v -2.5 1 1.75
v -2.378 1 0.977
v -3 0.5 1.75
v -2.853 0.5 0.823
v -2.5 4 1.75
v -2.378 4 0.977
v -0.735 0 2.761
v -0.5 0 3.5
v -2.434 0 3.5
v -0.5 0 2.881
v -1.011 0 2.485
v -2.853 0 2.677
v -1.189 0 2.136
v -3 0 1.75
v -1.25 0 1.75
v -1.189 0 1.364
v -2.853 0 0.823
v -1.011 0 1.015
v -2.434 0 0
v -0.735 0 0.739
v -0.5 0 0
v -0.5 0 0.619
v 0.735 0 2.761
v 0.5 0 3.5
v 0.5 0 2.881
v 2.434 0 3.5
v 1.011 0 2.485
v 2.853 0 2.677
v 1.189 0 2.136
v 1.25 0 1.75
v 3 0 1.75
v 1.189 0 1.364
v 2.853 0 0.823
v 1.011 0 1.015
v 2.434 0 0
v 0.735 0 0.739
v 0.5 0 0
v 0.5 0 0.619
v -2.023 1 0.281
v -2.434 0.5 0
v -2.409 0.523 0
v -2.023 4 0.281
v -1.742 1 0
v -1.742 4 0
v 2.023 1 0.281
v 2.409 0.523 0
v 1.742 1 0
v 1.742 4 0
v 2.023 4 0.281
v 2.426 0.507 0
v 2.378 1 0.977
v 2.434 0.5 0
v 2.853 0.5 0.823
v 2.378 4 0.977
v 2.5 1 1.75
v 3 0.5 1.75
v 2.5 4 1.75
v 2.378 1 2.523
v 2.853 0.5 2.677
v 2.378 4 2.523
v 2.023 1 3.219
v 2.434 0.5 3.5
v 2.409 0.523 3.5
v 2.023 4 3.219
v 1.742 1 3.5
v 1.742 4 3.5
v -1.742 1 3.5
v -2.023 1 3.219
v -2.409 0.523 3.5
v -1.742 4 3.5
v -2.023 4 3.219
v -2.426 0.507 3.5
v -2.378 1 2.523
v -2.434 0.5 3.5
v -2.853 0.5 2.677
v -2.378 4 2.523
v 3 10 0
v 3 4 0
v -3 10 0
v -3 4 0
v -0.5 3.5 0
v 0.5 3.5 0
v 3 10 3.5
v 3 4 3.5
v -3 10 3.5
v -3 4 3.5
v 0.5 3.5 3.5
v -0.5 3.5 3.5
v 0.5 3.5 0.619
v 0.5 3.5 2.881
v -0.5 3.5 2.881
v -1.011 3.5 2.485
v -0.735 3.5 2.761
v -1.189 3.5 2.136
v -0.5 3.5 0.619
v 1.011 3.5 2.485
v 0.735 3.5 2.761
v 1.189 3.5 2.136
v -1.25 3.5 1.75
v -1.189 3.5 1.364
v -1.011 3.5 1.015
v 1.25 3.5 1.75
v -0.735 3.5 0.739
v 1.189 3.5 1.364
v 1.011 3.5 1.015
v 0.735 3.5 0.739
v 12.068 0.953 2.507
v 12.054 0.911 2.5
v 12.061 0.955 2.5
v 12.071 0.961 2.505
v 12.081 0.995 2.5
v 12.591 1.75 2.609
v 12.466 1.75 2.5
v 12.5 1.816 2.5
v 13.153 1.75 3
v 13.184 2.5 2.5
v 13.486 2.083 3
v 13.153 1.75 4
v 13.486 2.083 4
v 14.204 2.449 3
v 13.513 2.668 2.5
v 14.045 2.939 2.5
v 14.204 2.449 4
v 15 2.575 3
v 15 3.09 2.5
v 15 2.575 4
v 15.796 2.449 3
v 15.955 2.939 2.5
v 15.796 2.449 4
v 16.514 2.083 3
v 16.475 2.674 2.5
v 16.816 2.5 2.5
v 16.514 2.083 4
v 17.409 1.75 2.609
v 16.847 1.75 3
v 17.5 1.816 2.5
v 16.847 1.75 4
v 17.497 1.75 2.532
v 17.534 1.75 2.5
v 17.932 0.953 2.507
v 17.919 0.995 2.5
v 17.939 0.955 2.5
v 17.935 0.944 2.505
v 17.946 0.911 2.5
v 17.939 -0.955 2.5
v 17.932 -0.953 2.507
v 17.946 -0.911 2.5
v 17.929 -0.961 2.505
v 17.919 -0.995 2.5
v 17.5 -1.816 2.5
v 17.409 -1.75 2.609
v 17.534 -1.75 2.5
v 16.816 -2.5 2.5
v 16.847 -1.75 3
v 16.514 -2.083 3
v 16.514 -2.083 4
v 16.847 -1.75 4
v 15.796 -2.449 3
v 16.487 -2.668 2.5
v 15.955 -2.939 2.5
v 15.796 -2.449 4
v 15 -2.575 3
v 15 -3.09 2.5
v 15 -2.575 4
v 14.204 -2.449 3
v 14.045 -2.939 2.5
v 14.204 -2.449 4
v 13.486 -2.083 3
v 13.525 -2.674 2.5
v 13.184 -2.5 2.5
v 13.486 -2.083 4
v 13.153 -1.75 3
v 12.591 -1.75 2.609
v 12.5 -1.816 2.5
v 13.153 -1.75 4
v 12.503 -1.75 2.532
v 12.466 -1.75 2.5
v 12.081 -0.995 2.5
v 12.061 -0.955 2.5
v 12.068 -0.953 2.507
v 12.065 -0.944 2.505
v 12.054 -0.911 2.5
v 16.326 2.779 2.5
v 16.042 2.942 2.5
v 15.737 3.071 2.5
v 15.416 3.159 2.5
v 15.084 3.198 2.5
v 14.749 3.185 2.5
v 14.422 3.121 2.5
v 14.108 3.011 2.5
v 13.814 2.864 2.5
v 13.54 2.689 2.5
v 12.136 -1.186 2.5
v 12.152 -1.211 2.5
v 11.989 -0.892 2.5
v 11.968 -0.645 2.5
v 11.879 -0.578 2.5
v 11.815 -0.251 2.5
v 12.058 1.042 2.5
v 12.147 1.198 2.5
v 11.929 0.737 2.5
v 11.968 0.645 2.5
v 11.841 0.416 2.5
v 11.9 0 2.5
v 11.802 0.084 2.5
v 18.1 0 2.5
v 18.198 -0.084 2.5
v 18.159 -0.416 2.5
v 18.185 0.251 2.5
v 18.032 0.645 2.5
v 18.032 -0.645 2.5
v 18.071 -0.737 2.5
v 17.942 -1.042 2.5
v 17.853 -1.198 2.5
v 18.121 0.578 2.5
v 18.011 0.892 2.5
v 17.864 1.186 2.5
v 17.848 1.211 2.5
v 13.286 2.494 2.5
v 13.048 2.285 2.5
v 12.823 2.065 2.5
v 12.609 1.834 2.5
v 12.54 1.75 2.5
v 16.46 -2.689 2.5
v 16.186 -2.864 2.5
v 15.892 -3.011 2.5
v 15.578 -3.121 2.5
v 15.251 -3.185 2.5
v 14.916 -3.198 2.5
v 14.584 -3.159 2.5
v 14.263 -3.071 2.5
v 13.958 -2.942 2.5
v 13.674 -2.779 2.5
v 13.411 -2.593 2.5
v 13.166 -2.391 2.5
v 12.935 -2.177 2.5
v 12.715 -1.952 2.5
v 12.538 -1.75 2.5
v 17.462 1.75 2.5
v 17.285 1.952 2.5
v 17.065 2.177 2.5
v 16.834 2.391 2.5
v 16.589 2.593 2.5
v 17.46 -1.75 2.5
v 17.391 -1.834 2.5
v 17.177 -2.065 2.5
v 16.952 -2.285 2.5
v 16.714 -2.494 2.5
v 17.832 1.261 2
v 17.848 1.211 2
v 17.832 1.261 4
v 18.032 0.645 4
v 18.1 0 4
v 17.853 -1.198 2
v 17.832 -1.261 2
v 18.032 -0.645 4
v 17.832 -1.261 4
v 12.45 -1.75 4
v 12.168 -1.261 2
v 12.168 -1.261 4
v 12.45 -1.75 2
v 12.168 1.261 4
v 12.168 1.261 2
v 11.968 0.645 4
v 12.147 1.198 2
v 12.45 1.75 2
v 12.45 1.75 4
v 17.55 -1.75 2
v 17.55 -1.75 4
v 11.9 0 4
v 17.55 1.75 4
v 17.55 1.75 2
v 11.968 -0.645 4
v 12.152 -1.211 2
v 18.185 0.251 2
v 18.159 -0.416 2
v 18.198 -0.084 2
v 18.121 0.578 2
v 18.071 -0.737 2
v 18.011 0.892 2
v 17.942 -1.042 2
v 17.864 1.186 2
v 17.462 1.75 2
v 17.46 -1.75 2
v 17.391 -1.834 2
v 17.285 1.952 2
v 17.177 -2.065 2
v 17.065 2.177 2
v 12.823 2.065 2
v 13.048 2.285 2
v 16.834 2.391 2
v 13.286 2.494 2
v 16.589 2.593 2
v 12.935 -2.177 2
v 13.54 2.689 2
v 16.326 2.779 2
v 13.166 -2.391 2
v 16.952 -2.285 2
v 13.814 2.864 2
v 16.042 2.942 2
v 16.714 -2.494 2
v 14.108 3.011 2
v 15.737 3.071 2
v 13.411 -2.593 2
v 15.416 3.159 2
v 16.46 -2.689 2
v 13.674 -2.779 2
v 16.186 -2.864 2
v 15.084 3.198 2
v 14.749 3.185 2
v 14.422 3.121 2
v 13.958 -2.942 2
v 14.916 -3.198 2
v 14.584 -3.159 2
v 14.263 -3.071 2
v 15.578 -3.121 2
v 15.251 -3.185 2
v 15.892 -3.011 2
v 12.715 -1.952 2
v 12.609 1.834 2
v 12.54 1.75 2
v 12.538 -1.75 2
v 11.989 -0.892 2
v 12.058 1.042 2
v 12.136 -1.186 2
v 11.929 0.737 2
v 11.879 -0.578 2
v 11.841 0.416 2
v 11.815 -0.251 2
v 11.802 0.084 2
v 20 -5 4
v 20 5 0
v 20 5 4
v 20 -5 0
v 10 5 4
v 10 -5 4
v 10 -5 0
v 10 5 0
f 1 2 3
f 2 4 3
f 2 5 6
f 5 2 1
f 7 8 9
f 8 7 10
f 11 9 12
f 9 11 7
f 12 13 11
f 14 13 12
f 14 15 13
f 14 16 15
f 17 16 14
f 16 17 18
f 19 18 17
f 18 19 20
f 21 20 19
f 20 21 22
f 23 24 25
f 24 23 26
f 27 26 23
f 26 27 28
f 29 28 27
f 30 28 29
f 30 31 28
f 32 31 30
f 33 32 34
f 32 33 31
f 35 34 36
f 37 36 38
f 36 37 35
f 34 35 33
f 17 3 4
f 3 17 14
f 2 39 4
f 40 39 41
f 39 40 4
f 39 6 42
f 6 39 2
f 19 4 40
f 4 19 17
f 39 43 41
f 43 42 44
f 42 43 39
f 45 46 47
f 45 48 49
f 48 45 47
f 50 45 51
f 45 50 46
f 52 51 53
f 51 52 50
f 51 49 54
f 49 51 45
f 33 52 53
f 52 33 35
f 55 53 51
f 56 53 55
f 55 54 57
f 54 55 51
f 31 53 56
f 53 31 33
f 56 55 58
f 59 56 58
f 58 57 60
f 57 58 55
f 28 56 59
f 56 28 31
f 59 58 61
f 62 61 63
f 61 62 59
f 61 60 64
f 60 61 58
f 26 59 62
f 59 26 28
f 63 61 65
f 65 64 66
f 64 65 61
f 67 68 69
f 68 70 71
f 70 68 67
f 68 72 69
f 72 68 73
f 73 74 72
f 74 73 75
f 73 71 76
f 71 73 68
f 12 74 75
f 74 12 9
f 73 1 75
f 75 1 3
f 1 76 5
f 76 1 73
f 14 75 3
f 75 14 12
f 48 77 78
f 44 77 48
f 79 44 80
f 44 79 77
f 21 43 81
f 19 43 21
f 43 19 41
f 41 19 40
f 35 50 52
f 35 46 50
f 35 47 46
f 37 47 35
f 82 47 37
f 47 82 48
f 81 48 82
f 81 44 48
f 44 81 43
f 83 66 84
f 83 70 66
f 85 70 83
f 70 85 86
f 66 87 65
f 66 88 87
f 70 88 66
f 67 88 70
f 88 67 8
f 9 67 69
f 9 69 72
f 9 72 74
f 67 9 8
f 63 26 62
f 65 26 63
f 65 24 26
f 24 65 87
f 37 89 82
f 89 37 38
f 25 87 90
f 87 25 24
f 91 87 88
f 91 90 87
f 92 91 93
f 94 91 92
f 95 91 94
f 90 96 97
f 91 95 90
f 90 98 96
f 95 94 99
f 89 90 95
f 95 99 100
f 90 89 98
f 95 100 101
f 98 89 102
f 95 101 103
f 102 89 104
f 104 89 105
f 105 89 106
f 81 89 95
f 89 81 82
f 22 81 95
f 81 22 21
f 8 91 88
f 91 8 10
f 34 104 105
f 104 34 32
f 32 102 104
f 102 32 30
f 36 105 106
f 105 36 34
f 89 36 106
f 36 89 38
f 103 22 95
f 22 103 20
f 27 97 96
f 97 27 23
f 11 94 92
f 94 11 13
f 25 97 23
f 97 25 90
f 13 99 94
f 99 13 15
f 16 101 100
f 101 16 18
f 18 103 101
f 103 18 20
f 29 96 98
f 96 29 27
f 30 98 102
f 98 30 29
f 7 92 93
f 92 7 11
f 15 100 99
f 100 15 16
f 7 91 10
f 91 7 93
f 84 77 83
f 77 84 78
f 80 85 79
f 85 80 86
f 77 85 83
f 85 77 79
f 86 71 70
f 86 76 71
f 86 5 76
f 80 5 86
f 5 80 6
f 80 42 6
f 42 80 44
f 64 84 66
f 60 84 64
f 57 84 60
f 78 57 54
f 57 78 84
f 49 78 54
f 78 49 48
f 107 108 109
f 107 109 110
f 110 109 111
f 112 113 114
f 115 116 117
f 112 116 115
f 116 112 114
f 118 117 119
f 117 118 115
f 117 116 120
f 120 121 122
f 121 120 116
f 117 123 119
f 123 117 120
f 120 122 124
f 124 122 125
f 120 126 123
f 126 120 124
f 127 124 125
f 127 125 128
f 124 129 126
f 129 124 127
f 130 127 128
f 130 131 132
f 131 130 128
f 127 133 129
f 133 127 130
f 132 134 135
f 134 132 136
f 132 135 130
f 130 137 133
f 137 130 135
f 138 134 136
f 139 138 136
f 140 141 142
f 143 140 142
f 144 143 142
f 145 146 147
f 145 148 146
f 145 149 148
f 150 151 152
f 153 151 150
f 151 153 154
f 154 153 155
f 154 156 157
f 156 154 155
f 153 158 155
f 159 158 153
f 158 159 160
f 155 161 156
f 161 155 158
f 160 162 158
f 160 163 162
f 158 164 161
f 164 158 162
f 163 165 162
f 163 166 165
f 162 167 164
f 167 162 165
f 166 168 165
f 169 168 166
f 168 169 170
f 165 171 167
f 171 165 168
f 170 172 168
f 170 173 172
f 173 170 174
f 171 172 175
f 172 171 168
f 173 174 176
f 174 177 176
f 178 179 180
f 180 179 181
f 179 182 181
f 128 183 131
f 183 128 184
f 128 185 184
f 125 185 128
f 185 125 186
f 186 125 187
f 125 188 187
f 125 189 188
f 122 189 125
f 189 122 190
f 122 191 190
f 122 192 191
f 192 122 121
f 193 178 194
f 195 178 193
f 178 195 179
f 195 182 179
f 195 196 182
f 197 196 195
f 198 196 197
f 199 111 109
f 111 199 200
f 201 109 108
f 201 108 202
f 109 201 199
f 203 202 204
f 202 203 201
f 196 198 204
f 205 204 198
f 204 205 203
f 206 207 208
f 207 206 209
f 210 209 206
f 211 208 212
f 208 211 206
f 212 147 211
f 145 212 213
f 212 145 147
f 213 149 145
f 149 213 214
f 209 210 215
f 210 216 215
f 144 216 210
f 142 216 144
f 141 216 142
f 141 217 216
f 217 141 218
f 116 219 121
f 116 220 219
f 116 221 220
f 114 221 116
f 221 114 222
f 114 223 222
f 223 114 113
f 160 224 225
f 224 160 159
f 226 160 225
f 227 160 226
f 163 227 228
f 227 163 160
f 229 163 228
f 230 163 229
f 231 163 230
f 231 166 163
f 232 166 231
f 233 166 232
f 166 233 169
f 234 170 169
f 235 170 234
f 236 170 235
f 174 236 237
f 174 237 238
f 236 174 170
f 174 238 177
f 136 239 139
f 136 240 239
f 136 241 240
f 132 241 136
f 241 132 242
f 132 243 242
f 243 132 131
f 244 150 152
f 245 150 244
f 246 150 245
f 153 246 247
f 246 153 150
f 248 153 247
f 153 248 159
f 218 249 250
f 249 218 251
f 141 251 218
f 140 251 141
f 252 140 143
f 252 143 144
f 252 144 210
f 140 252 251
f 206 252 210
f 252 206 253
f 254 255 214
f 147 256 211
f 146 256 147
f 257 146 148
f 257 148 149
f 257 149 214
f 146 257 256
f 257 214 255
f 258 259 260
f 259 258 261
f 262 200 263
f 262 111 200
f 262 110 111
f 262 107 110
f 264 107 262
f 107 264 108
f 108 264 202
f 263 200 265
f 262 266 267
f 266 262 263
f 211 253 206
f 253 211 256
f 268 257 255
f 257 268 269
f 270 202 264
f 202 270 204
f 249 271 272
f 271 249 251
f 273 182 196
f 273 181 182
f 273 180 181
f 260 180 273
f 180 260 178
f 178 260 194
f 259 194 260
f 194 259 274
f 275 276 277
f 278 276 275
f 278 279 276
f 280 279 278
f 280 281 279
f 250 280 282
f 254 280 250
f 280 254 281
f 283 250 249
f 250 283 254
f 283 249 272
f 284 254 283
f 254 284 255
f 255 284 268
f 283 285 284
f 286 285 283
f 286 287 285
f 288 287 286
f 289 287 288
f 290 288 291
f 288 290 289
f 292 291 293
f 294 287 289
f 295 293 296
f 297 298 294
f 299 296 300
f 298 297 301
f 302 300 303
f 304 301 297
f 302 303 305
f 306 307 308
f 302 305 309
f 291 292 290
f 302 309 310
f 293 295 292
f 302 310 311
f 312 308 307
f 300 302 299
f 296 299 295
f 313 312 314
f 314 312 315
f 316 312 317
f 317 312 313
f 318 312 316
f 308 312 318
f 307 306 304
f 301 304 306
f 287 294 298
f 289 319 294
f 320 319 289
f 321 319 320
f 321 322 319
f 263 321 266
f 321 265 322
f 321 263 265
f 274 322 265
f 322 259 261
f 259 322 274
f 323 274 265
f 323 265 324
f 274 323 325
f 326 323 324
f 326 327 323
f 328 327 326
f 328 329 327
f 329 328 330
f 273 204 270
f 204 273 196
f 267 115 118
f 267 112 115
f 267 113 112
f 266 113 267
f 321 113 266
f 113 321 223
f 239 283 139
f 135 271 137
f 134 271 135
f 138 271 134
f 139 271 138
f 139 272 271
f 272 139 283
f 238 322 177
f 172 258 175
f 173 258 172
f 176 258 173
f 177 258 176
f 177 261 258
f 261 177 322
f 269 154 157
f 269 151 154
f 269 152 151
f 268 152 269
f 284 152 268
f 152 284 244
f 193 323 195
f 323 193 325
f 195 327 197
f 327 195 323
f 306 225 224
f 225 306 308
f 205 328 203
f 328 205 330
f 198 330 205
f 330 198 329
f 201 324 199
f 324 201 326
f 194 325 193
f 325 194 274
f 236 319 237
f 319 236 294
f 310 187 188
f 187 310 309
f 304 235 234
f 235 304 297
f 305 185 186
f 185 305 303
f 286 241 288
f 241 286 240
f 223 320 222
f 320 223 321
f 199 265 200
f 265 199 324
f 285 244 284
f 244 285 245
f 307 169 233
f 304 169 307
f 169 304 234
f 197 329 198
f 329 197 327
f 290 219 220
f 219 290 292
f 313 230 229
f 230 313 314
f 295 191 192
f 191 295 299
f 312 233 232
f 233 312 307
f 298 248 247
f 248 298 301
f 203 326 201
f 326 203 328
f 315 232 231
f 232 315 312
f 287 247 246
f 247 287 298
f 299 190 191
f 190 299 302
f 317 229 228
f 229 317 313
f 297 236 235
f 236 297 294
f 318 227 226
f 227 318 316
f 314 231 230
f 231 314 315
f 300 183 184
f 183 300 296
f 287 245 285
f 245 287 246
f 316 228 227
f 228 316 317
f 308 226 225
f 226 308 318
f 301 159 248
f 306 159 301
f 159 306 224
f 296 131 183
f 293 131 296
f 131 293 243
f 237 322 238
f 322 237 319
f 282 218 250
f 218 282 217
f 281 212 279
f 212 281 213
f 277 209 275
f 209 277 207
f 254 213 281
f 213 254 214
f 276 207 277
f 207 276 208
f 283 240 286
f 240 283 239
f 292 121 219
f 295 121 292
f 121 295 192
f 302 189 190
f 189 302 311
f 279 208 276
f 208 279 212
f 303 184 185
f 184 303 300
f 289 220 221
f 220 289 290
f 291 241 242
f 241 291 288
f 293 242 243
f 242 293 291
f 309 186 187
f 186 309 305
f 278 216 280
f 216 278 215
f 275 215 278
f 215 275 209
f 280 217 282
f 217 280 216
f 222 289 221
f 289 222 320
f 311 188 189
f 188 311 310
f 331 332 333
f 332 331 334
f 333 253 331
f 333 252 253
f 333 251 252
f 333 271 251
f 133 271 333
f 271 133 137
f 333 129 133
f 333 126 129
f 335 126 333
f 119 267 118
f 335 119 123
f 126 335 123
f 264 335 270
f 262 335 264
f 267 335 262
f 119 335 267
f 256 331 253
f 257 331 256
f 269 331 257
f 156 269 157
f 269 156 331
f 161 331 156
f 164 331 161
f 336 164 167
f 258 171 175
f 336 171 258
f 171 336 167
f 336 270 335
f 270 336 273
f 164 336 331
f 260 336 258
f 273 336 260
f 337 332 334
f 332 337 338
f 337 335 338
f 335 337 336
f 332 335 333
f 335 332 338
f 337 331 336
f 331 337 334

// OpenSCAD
lipl = 1.0; //lip length
lipd = 6.0;
ebl = 5.0; //overall length of the endbody
linkd = 5.0; //link body diameter
linkh = 3.5; //link body height 
splitw = 1.0;
splitl = 3.5;

POINTS = 60;

mr = lipd/2 +0.2; //max radius of locking cam surface
subt = 0.2;

ia = 360 / POINTS;

    
polypoints =    ([ 
                    for (i = [0 : POINTS-1]) 
                        [(mr-(subt*((sin(4*i*ia)+1))/2))*cos(i*ia),
                         (mr-(subt*((sin(4*i*ia)+1))/2))*sin(i*ia)] 
                ]);


endbody_points = [
                    [0,0],
                    [0,ebl],
                    [linkd/2,ebl],
                    [linkd/2,lipl],
                    [lipd/2,lipl/2],
                    [lipd/2,0]
                 ];
union(){
    translate([0,0,linkh/2])
    rotate(90,[-1,0,0])
    difference(){
        rotate_extrude($fn=20)
        polygon(endbody_points);
        
        //top and bottom cutting cubes
        translate([-5,linkh/2,0])cube([10,10,10]);
        translate([-5,-10-linkh/2,0])cube([10,10,10]);
        
        //split cutting cube
        translate([-splitw/2,-5,0])cube([splitw,10,splitl]);
        
        //split cutting cylinder
        cylinder(h=splitl, d=linkd-2.5,$fn=20);
    }
    translate([-3,4,0])cube([6,6,3.5]);
}
translate([15,0,0]){
    difference(){
        translate([-5,-5,0])
        cube([10,10,4]);
        
        translate([0,0,2])
        union(){
           
            linear_extrude(height=0.5)
            rotate(22.5)
            polygon(polypoints);
                
            
            
            difference(){
                scale([1.03,1.03,1])
                rotate_extrude($fn=20)
                polygon(endbody_points);
                translate([0,0,-5+lipl/2])cube([10,10,10],center=true);
            }
            difference(){
                cylinder(h=ebl,d=lipd+0.2,$fn=30);
                translate([-5,linkh/2,0])cube([10,10,10]);
                translate([-5,-10-linkh/2,0])cube([10,10,10]);
            }
        }
    }
}
